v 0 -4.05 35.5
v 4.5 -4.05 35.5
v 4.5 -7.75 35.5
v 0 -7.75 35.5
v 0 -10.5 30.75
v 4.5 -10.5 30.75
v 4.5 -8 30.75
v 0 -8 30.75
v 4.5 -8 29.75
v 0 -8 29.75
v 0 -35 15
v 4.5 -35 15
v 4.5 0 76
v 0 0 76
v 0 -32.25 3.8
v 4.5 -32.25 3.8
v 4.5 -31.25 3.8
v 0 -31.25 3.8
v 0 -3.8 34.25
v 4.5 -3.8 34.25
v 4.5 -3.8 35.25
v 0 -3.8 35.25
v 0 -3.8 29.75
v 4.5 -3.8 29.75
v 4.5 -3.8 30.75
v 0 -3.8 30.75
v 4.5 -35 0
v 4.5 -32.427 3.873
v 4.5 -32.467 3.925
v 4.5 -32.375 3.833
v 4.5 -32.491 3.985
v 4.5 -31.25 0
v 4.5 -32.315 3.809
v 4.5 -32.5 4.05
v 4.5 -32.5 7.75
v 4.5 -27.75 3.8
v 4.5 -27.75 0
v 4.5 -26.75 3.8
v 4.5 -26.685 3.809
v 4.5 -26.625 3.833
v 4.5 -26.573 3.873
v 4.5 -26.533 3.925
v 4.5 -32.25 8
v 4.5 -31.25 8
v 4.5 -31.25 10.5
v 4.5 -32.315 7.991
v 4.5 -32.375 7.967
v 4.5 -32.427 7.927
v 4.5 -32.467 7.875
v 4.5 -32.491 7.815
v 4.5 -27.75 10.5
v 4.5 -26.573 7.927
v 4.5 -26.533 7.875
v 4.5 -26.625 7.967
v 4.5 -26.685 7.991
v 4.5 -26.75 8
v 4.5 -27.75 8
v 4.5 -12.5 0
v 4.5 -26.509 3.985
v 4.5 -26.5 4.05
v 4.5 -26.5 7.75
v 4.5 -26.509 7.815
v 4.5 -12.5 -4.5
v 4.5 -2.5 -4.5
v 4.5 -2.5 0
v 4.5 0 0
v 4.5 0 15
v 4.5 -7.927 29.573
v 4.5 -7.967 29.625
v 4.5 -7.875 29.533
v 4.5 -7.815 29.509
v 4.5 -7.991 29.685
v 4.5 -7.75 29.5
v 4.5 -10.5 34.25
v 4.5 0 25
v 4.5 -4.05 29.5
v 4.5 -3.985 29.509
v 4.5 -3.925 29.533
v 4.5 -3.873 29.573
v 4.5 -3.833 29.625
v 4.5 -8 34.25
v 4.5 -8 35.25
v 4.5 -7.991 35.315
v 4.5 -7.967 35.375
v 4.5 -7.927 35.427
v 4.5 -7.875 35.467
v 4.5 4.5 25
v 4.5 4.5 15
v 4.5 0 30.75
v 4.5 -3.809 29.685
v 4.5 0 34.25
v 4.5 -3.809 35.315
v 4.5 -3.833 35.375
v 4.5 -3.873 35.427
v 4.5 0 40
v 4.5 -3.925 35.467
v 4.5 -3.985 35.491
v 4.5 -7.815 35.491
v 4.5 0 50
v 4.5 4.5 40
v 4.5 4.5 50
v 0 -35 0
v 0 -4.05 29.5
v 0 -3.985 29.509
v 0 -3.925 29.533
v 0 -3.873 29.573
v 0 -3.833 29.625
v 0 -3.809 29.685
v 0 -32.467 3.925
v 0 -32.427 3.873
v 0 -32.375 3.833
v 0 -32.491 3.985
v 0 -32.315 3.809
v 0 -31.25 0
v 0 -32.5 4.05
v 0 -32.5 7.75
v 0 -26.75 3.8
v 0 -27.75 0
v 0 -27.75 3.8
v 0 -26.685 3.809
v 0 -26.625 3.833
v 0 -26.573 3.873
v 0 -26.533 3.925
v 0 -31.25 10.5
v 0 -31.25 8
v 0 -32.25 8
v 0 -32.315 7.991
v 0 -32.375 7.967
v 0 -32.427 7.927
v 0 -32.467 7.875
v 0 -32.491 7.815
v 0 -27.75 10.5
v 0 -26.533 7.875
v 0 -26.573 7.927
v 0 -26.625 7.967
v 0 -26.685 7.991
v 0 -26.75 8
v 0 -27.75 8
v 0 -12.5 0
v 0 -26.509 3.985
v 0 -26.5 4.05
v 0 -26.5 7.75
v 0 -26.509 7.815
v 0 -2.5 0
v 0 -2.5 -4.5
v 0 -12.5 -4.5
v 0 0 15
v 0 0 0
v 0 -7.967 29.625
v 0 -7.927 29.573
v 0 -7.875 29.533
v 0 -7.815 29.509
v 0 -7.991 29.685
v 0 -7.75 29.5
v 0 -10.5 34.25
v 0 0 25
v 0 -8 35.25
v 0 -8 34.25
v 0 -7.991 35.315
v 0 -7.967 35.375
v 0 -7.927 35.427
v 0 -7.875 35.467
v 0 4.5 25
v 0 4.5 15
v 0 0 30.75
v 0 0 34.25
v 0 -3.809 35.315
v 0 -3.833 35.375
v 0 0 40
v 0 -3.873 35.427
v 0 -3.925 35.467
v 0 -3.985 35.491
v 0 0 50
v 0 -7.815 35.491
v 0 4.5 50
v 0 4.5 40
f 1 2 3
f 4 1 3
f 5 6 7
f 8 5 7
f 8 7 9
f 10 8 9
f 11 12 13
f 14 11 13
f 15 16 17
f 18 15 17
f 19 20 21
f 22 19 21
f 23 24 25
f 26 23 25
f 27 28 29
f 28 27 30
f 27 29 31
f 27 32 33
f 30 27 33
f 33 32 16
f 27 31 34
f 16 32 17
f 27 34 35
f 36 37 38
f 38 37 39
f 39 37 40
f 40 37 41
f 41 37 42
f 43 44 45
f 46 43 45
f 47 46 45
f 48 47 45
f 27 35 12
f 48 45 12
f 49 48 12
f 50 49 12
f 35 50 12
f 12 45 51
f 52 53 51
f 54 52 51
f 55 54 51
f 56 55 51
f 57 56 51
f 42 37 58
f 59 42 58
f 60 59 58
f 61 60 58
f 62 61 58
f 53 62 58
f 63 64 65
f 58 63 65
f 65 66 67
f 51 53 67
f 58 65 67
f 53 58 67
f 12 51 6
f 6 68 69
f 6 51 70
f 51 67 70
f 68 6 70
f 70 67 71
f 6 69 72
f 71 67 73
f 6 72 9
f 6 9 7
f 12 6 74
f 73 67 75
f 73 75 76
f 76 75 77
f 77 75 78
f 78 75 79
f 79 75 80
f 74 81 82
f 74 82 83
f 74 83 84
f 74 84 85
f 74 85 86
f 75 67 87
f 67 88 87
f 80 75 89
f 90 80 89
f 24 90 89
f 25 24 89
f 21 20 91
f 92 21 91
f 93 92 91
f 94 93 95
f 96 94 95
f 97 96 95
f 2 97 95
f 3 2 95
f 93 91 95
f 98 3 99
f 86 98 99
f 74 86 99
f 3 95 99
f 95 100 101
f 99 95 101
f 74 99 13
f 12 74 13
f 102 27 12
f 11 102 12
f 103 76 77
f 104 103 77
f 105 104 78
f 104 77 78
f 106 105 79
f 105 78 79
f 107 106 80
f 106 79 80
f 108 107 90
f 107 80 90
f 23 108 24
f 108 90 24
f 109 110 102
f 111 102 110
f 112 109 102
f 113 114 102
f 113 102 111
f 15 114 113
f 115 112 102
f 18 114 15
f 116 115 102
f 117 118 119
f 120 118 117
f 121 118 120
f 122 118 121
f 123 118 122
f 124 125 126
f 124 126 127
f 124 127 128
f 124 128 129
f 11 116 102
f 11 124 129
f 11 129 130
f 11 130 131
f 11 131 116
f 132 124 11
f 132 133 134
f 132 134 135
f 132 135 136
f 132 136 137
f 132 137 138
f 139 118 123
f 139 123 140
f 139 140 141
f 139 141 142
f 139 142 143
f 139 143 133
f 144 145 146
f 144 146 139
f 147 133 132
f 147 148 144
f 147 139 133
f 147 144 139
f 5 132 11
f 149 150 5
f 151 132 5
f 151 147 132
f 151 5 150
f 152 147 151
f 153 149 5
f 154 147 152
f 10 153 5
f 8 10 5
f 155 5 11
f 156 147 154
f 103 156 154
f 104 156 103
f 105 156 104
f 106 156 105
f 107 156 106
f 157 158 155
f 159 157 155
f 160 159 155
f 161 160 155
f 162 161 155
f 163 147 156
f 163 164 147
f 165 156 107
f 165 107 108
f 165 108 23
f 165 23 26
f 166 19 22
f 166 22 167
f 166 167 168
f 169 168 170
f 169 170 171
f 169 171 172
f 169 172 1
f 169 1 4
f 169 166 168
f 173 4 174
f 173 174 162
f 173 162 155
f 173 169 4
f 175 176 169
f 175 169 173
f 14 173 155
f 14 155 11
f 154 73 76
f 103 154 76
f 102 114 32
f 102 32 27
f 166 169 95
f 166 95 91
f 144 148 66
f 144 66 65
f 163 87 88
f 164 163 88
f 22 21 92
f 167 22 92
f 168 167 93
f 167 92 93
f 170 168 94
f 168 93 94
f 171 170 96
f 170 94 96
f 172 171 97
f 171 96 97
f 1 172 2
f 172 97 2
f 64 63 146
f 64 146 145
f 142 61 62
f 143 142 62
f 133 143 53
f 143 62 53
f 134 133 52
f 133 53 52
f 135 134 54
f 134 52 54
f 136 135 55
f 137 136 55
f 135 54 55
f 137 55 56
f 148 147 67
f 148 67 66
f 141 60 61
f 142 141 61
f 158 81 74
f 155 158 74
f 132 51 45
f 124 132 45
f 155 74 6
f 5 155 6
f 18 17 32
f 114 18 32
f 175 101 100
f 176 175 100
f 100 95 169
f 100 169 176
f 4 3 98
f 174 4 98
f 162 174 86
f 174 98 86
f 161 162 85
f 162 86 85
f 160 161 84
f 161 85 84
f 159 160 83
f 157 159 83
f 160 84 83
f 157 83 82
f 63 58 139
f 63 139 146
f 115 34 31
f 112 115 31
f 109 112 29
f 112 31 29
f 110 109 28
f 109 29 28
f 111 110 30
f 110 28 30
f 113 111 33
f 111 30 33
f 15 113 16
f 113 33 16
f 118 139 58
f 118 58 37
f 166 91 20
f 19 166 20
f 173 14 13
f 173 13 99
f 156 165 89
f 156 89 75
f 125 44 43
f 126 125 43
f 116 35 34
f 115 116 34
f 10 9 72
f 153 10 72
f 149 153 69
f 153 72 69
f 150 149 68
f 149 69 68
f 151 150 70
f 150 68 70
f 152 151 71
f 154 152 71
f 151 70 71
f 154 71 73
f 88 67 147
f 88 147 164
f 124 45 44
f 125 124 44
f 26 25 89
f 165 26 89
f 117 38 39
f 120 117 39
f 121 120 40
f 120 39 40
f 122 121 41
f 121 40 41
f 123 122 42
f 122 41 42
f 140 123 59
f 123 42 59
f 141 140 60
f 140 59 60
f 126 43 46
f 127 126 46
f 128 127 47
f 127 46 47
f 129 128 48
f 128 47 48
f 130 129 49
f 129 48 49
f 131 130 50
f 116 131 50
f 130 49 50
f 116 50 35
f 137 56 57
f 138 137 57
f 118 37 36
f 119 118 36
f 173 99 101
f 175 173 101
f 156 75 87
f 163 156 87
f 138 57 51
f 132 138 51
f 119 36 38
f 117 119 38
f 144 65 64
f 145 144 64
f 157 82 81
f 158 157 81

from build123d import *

# Parameters (mm, degrees)
BOSS_EXTRUDE1_DEPTH = 4.5
SKETCH2_W           = 9
SKETCH2_H           = 10
BOSS_EXTRUDE2_DEPTH = 4.5
BOSS_EXTRUDE3_DEPTH = 4.5
CUT_EXTRUDE1_DEPTH  = 84.792899461
SKETCH5_W           = 10
SKETCH5_H           = 9
BOSS_EXTRUDE4_DEPTH = 4.5
CUT_EXTRUDE2_DEPTH  = 84.792899461


with BuildPart() as part:
    # Sketch1 → Boss-Extrude1 (new body)
    with BuildSketch(Plane(origin=(0, 0, 0), x_dir=(0, 0, -1), z_dir=(1, 0, 0))):
        Polygon((0, 0), (0, -35), (-76, 0), align=None)
    extrude(amount=BOSS_EXTRUDE1_DEPTH)

    # Sketch2 → Boss-Extrude2 (add, through all)
    with BuildSketch(Plane(origin=(4.5, 0, 0), x_dir=(0, 0, -1), z_dir=(1, 0, 0))):
        with Locations((0, -7.5)):
            Rectangle(SKETCH2_W, SKETCH2_H)
    extrude(amount=-BOSS_EXTRUDE2_DEPTH)

    # Sketch3 → Boss-Extrude3 (add, through all)
    with BuildSketch(Plane(origin=(4.5, 0, 0), x_dir=(0, 0, -1), z_dir=(1, 0, 0))):
        Polygon((0, -35), (-15, -35), (-76, 0), (0, -25), align=None)
    extrude(amount=-BOSS_EXTRUDE3_DEPTH)

    # Sketch4 → Cut-Extrude1 (cut, through all)
    with BuildSketch(Plane(origin=(4.5, 0, 0), x_dir=(0, 0, -1), z_dir=(1, 0, 0))):
        with BuildLine():
            Line((0, -31.25), (0, -27.75))
            Line((0, -27.75), (-3.8, -27.75))
            Line((-3.8, -27.75), (-3.8, -26.75))
            ThreePointArc((-3.8, -26.75), (-3.873223305, -26.573223305), (-4.05, -26.5))
            Line((-4.05, -26.5), (-7.75, -26.5))
            ThreePointArc((-7.75, -26.5), (-7.926776695, -26.573223305), (-8, -26.75))
            Line((-8, -26.75), (-8, -27.75))
            Line((-8, -27.75), (-10.5, -27.75))
            Line((-10.5, -27.75), (-10.5, -31.25))
            Line((-10.5, -31.25), (-8, -31.25))
            Line((-8, -31.25), (-8, -32.25))
            ThreePointArc((-8, -32.25), (-7.926776695, -32.426776695), (-7.75, -32.5))
            Line((-7.75, -32.5), (-4.05, -32.5))
            ThreePointArc((-4.05, -32.5), (-3.873223305, -32.426776695), (-3.8, -32.25))
            Line((-3.8, -32.25), (-3.8, -31.25))
            Line((-3.8, -31.25), (0, -31.25))
        make_face()
    extrude(amount=-CUT_EXTRUDE1_DEPTH, mode=Mode.SUBTRACT)

    # Sketch5 → Boss-Extrude4 (add, through all)
    with BuildSketch(Plane(origin=(4.5, 0, 0), x_dir=(0, 0, -1), z_dir=(1, 0, 0))):
        with Locations((-20, 0)):
            Rectangle(SKETCH5_W, SKETCH5_H)
        with Locations((-45, 0)):
            Rectangle(SKETCH5_W, SKETCH5_H)
    extrude(amount=-BOSS_EXTRUDE4_DEPTH)

    # Sketch6 → Cut-Extrude2 (cut, through all)
    with BuildSketch(Plane(origin=(4.5, 0, 0), x_dir=(0, 0, -1), z_dir=(1, 0, 0))):
        with BuildLine():
            Line((-30.75, 0), (-34.25, 0))
            Line((-34.25, 0), (-34.25, -3.8))
            Line((-34.25, -3.8), (-35.25, -3.8))
            ThreePointArc((-35.25, -3.8), (-35.426776695, -3.873223305), (-35.5, -4.05))
            Line((-35.5, -4.05), (-35.5, -7.75))
            ThreePointArc((-35.5, -7.75), (-35.426776695, -7.926776695), (-35.25, -8))
            Line((-35.25, -8), (-34.25, -8))
            Line((-34.25, -8), (-34.25, -10.5))
            Line((-34.25, -10.5), (-30.75, -10.5))
            Line((-30.75, -10.5), (-30.75, -8))
            Line((-30.75, -8), (-29.75, -8))
            ThreePointArc((-29.75, -8), (-29.573223305, -7.926776695), (-29.5, -7.75))
            Line((-29.5, -7.75), (-29.5, -4.05))
            ThreePointArc((-29.5, -4.05), (-29.573223305, -3.873223305), (-29.75, -3.8))
            Line((-29.75, -3.8), (-30.75, -3.8))
            Line((-30.75, -3.8), (-30.75, 0))
        make_face()
    extrude(amount=-CUT_EXTRUDE2_DEPTH, mode=Mode.SUBTRACT)


solid = part.part
